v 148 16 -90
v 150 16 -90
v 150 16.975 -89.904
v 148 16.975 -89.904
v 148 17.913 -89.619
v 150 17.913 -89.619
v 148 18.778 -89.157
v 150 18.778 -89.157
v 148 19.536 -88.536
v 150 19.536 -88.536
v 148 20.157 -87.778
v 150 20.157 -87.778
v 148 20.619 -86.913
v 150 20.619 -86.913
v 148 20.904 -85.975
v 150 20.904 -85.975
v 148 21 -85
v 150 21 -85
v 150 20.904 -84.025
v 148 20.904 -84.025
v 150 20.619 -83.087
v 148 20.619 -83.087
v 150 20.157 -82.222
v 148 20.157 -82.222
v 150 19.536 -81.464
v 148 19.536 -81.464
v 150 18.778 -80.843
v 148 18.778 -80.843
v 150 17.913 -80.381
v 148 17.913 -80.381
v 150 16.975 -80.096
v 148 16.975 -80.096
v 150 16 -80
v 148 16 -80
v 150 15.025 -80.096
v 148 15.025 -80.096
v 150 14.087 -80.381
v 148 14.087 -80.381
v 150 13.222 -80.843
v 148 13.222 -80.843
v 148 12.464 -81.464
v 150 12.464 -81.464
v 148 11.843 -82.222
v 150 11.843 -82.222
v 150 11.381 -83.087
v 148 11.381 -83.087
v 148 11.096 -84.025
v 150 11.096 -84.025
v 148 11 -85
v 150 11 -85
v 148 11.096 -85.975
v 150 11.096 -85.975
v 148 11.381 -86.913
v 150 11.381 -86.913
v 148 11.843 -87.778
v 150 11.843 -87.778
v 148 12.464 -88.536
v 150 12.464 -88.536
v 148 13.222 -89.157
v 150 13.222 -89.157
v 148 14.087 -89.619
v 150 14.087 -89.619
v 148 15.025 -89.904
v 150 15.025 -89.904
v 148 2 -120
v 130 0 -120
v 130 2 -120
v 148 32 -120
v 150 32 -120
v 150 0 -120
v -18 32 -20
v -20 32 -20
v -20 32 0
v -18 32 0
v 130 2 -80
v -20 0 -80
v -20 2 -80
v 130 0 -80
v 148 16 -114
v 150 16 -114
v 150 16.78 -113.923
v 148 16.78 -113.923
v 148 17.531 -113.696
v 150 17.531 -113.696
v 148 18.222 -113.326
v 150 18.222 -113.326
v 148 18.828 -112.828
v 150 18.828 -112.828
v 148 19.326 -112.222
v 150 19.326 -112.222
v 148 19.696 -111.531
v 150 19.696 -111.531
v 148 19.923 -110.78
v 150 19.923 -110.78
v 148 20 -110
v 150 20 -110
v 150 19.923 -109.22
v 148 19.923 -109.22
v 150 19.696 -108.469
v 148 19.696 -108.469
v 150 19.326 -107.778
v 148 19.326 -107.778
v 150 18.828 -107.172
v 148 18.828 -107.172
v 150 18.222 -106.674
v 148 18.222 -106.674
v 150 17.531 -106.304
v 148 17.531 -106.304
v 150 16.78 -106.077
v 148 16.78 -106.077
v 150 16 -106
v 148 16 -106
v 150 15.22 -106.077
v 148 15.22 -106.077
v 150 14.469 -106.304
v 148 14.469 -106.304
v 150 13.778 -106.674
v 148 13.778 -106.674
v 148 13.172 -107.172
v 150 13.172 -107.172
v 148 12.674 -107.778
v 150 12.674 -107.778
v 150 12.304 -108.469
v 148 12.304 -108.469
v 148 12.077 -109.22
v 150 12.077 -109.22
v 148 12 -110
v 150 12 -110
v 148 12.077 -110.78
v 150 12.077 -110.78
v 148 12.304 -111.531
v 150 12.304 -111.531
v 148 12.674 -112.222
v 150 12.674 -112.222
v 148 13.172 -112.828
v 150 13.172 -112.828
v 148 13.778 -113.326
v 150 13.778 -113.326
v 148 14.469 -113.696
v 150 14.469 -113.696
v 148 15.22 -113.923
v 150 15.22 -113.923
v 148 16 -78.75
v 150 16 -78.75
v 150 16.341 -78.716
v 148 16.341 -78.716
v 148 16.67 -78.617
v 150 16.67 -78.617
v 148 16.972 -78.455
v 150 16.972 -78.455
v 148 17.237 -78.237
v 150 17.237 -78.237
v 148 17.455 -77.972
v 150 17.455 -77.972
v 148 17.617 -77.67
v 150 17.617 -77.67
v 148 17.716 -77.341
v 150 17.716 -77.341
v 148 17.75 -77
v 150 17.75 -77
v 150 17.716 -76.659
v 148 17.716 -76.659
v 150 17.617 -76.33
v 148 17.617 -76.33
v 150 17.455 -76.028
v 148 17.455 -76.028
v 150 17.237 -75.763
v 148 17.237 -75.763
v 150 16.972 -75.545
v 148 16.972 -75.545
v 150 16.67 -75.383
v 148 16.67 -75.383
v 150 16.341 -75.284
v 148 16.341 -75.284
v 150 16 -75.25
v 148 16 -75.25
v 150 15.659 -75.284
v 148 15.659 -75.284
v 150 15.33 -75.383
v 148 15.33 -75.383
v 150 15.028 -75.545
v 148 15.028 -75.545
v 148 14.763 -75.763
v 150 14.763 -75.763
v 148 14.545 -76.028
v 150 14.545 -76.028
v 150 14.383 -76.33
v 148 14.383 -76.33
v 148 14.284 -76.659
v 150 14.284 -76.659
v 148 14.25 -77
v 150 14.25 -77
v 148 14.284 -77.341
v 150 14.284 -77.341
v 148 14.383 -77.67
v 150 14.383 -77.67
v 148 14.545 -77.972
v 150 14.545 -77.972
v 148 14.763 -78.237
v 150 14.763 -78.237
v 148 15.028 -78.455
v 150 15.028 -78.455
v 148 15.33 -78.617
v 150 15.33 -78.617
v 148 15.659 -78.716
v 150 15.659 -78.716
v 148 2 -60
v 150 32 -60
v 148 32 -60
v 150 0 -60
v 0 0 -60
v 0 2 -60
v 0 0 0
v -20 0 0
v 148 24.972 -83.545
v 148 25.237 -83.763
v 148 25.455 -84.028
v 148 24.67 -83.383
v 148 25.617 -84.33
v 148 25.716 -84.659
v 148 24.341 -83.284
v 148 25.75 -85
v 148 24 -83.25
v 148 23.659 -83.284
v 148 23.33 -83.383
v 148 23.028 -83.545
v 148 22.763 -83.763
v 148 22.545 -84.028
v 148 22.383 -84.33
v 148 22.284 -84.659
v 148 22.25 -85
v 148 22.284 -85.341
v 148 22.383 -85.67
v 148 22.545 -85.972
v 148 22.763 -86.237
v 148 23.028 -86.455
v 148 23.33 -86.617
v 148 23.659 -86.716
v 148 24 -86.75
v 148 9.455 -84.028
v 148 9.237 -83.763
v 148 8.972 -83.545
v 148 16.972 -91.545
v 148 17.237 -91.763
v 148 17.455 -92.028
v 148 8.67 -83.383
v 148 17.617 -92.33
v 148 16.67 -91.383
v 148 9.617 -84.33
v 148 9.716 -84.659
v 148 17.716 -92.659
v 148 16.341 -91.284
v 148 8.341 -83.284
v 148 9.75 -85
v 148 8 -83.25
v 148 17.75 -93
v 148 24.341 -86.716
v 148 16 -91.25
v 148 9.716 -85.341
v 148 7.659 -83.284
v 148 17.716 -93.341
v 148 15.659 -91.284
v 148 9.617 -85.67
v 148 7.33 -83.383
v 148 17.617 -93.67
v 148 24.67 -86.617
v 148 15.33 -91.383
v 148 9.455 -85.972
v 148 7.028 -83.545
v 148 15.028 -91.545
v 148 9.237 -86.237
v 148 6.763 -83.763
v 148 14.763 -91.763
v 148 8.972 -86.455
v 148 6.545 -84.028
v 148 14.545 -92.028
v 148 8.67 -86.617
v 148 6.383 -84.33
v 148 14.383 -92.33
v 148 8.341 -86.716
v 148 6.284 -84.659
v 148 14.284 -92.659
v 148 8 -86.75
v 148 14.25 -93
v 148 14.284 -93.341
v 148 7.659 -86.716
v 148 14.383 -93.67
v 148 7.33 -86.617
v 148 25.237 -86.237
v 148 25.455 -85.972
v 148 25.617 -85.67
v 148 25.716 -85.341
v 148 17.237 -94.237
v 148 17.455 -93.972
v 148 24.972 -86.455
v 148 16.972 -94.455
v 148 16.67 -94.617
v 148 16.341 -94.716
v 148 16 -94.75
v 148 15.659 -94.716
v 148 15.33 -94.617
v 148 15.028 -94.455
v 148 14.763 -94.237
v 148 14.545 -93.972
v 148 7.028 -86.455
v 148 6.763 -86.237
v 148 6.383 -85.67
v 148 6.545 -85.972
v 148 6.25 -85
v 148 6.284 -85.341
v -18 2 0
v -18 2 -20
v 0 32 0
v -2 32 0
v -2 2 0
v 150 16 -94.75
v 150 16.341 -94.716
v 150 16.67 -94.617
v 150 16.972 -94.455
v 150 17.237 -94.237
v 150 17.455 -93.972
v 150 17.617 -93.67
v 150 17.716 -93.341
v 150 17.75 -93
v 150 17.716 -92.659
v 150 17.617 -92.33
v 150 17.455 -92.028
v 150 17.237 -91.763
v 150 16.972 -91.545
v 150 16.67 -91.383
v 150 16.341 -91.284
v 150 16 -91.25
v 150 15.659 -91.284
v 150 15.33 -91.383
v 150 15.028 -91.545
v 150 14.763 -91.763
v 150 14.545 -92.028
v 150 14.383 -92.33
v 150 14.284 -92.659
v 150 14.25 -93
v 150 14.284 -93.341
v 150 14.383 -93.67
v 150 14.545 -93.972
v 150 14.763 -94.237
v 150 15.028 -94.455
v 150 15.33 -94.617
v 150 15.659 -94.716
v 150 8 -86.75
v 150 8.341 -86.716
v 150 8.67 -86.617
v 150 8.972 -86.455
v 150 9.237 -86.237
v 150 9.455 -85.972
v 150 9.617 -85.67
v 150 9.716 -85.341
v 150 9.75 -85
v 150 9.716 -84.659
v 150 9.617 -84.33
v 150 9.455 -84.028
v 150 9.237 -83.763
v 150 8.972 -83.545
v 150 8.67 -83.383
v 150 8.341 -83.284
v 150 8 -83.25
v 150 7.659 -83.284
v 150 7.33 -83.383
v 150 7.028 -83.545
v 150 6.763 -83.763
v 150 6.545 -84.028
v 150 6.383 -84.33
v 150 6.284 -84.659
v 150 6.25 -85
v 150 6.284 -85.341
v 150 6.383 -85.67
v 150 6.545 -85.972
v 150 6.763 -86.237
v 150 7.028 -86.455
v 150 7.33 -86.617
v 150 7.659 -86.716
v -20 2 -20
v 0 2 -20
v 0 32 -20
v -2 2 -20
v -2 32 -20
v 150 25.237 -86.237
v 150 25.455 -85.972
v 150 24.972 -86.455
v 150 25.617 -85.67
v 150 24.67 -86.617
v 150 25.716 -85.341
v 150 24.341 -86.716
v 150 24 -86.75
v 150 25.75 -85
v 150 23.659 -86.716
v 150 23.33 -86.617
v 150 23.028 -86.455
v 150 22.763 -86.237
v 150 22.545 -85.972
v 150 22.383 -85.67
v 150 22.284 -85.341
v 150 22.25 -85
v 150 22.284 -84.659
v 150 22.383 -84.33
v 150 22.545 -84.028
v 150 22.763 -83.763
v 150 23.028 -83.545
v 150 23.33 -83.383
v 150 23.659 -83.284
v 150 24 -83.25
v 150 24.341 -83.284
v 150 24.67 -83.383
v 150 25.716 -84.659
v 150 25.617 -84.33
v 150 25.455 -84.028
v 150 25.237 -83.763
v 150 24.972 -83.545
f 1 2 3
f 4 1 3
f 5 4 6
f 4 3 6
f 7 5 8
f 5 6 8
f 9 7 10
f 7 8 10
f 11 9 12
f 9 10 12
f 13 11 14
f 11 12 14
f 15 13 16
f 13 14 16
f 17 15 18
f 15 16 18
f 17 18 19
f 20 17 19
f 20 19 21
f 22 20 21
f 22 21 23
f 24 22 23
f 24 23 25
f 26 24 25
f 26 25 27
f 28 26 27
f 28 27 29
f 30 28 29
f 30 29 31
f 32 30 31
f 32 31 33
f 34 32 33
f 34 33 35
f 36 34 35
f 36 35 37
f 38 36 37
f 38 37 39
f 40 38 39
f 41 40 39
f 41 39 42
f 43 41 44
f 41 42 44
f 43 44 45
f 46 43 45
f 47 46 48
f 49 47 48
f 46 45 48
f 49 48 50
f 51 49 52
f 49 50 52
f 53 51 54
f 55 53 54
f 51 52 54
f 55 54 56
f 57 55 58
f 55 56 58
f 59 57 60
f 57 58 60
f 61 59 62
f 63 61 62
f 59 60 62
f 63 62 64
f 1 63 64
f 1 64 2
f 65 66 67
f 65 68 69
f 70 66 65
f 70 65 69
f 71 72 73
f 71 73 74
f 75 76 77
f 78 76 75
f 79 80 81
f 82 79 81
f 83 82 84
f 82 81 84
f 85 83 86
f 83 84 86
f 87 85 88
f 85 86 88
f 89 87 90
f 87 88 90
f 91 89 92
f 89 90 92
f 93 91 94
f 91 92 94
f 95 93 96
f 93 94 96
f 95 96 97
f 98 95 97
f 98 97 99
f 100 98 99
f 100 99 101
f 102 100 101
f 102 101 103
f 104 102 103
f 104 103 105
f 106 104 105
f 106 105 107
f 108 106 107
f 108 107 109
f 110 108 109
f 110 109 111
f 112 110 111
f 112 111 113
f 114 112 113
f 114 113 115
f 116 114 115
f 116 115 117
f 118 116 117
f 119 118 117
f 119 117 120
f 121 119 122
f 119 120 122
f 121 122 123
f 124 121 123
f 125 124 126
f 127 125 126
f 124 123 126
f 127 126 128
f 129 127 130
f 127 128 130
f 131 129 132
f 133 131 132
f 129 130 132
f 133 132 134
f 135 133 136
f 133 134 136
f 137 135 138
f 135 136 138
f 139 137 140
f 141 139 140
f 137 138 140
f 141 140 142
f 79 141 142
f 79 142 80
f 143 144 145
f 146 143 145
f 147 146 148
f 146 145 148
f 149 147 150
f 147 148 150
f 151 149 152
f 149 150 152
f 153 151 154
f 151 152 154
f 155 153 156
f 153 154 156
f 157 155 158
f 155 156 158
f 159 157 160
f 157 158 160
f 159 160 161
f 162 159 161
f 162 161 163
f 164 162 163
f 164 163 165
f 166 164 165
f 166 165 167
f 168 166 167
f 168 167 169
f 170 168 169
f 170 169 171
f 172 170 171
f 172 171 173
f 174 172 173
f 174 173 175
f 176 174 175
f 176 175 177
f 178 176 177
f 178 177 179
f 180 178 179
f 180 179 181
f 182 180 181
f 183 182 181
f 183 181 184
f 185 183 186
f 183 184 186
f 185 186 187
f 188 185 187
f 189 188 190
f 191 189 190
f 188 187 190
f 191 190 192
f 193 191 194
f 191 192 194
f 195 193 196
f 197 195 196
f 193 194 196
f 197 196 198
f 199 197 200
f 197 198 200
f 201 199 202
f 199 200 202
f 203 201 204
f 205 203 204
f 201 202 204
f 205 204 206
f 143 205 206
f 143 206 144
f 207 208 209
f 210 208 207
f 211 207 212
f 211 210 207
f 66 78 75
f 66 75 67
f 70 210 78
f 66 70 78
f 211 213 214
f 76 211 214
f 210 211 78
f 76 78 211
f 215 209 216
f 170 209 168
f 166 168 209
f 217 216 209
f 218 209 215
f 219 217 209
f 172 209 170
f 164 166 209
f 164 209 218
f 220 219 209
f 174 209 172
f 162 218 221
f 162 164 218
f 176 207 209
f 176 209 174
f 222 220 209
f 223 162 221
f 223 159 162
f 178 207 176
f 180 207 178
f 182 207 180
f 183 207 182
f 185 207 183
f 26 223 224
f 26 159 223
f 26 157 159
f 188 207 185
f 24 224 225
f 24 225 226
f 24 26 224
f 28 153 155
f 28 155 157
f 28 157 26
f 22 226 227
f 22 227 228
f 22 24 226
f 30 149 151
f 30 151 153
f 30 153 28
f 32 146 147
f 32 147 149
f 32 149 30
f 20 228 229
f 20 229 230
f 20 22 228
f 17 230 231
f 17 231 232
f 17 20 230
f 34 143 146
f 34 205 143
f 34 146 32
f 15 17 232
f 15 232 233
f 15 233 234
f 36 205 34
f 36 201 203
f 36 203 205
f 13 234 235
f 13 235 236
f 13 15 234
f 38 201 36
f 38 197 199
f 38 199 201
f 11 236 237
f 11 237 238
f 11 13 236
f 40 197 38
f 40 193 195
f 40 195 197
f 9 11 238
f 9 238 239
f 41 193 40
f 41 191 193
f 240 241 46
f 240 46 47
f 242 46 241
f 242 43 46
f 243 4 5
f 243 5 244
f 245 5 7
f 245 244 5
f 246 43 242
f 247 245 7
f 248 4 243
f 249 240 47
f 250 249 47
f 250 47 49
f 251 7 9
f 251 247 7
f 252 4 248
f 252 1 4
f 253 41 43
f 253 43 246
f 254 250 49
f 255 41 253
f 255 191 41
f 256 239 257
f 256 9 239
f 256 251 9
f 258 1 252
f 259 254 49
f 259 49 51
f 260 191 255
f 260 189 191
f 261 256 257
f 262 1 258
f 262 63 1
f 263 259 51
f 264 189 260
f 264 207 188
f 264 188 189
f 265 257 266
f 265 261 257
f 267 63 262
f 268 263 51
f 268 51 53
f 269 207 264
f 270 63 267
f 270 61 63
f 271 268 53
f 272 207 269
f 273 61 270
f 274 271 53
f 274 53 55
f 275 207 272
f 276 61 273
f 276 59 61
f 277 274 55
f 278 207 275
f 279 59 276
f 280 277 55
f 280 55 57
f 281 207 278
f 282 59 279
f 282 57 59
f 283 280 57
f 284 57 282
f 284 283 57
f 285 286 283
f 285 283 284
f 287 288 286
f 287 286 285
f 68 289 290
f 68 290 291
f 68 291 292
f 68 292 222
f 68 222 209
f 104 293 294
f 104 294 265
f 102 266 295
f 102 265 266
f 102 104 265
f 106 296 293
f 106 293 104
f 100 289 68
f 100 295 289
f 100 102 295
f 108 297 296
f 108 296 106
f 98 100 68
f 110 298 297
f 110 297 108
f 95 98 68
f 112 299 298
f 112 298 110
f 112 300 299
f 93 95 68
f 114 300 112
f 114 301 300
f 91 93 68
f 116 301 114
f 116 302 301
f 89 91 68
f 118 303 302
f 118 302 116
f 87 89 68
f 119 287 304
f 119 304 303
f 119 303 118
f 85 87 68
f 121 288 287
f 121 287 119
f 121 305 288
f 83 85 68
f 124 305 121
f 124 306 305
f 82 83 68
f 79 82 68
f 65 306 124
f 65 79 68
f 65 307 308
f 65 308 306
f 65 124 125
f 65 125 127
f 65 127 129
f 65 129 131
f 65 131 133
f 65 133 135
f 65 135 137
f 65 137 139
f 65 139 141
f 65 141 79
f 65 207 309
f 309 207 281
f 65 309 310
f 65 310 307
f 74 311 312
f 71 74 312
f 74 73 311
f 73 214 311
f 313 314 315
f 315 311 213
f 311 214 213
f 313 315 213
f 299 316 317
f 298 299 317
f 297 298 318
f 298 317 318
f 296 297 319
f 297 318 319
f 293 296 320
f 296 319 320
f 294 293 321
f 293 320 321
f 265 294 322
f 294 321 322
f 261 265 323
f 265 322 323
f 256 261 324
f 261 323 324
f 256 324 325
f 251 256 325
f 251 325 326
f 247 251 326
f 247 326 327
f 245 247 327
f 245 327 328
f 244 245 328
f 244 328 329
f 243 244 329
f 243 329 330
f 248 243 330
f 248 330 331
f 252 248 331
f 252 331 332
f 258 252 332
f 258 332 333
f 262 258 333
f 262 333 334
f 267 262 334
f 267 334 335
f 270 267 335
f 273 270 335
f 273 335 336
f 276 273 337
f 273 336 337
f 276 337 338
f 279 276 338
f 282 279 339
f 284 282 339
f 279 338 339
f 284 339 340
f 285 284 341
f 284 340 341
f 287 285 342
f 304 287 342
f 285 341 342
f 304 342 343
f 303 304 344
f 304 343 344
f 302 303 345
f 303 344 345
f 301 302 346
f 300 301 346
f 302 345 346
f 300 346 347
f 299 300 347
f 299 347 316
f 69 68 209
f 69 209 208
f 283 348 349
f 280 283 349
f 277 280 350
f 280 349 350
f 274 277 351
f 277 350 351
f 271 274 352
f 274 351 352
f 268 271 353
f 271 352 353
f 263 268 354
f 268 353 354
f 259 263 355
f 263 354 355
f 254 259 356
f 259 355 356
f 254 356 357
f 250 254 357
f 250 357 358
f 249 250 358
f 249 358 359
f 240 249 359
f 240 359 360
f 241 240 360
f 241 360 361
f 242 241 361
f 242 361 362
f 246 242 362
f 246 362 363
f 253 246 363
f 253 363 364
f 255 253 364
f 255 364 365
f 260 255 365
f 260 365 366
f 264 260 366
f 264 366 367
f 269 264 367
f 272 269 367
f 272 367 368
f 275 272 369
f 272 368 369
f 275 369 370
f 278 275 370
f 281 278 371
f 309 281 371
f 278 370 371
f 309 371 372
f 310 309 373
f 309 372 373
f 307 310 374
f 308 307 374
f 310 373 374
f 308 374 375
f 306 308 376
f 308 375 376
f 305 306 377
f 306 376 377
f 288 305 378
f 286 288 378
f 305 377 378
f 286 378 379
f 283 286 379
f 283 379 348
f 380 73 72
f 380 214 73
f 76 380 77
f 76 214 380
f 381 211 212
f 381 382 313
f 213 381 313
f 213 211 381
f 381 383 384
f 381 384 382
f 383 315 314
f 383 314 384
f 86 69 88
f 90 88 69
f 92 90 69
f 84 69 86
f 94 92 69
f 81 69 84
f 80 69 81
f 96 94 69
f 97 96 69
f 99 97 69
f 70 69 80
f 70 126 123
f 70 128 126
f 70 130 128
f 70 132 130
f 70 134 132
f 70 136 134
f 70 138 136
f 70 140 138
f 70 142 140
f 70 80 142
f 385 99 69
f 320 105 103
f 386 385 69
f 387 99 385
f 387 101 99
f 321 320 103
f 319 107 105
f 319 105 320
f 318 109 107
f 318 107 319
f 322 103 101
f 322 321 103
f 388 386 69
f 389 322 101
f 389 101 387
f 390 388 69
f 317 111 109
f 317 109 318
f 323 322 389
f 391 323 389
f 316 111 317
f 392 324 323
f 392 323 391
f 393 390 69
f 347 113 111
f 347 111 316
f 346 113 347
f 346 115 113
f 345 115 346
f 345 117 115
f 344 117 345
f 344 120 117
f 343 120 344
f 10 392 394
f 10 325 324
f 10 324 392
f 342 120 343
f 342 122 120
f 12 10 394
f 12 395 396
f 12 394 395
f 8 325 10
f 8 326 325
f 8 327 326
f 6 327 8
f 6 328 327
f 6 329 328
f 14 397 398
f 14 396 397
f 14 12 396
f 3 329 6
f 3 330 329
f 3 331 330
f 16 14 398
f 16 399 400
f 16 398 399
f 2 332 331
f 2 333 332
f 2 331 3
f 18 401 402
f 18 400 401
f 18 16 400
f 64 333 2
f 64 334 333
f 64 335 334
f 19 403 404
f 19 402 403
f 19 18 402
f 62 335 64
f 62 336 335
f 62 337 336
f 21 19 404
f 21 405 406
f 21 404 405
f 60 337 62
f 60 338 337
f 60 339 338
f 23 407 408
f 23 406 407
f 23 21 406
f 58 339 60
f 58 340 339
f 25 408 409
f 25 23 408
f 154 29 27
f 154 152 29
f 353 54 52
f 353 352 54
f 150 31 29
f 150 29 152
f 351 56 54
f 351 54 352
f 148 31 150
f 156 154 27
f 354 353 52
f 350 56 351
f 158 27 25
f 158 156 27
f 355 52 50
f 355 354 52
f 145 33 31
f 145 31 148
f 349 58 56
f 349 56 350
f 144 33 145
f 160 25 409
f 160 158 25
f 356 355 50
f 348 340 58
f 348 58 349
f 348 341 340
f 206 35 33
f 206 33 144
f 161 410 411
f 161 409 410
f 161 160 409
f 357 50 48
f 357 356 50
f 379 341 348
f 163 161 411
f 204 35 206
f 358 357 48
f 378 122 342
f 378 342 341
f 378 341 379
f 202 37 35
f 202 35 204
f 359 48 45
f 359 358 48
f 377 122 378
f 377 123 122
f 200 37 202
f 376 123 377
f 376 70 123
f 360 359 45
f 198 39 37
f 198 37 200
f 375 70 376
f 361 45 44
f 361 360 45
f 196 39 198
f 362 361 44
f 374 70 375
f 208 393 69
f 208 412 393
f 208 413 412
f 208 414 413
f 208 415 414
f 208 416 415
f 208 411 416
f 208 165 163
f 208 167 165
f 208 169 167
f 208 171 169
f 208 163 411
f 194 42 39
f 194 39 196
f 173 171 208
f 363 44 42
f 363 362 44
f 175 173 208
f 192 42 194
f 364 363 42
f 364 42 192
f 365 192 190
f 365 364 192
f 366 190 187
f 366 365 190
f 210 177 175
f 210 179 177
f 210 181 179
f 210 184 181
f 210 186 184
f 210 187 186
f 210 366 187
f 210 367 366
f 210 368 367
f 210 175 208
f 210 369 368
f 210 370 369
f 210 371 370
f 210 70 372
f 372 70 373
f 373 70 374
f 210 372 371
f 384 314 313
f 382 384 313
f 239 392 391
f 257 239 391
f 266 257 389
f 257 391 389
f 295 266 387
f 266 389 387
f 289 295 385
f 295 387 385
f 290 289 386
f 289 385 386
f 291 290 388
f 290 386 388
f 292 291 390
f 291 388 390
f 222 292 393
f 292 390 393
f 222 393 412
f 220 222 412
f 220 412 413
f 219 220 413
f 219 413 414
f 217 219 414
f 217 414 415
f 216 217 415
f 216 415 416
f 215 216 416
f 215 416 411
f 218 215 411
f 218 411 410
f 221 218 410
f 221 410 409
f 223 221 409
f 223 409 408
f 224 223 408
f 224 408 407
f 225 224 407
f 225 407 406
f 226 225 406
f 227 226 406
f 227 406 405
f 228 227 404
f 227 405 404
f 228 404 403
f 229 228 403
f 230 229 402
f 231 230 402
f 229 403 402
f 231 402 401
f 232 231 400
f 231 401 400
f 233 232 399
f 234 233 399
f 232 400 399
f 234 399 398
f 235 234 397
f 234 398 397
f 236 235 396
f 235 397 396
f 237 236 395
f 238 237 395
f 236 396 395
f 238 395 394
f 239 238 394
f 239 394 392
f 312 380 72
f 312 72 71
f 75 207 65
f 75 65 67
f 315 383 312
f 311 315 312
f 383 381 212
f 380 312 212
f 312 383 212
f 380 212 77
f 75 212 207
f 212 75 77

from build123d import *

# Parameters (mm, degrees)
BOSS_EXTRUDE1_DEPTH = 2
SKETCH2_W           = 2
SKETCH2_H           = 20
SKETCH2_H_2         = 60
BOSS_EXTRUDE2_DEPTH = 30
CUT_EXTRUDE1_REACH  = 212.533
SKETCH3_R           = 5
SKETCH3_R_2         = 1.75
SKETCH3_R_3         = 4


with BuildPart() as part:
    # Sketch1 → Boss-Extrude1 (new body)
    with BuildSketch(Plane(origin=(0, 0, 0), x_dir=(1, 0, 0), z_dir=(0, 1, 0))):
        Polygon((150, 120), (150, 60), (0, 60), (0, 0), (-20, 0), (-20, 80), (130, 80), (130, 120), align=None)
    extrude(amount=BOSS_EXTRUDE1_DEPTH)

    # Sketch2 → Boss-Extrude2 (add)
    with BuildSketch(Plane(origin=(0, 2, 0), x_dir=(1, 0, 0), z_dir=(0, 1, 0))):
        with Locations((-19, 10)):
            Rectangle(SKETCH2_W, SKETCH2_H)
        with Locations((-1, 10)):
            Rectangle(SKETCH2_W, SKETCH2_H)
        with Locations((149, 90)):
            Rectangle(SKETCH2_W, SKETCH2_H_2)
    extrude(amount=BOSS_EXTRUDE2_DEPTH)

    # Sketch3 → Cut-Extrude1 (cut, up to next)
    with BuildSketch(Plane(origin=(150, 0, 0), x_dir=(0, 0, -1), z_dir=(1, 0, 0)), mode=Mode.PRIVATE) as cut_extrude1_sk1:
        with Locations((85, 16)):
            Circle(SKETCH3_R)
    cut_extrude1_tool1 = extrude(cut_extrude1_sk1.sketch, amount=-CUT_EXTRUDE1_REACH, mode=Mode.PRIVATE) & part.part
    # Sketch3 → Cut-Extrude1 (cut, up to next)
    with BuildSketch(Plane(origin=(150, 0, 0), x_dir=(0, 0, -1), z_dir=(1, 0, 0)), mode=Mode.PRIVATE) as cut_extrude1_sk2:
        with Locations((85, 24)):
            Circle(SKETCH3_R_2)
    cut_extrude1_tool2 = extrude(cut_extrude1_sk2.sketch, amount=-CUT_EXTRUDE1_REACH, mode=Mode.PRIVATE) & part.part
    # Sketch3 → Cut-Extrude1 (cut, up to next)
    with BuildSketch(Plane(origin=(150, 0, 0), x_dir=(0, 0, -1), z_dir=(1, 0, 0)), mode=Mode.PRIVATE) as cut_extrude1_sk3:
        with Locations((93, 16)):
            Circle(SKETCH3_R_2)
    cut_extrude1_tool3 = extrude(cut_extrude1_sk3.sketch, amount=-CUT_EXTRUDE1_REACH, mode=Mode.PRIVATE) & part.part
    # Sketch3 → Cut-Extrude1 (cut, up to next)
    with BuildSketch(Plane(origin=(150, 0, 0), x_dir=(0, 0, -1), z_dir=(1, 0, 0)), mode=Mode.PRIVATE) as cut_extrude1_sk4:
        with Locations((85, 8)):
            Circle(SKETCH3_R_2)
    cut_extrude1_tool4 = extrude(cut_extrude1_sk4.sketch, amount=-CUT_EXTRUDE1_REACH, mode=Mode.PRIVATE) & part.part
    # Sketch3 → Cut-Extrude1 (cut, up to next)
    with BuildSketch(Plane(origin=(150, 0, 0), x_dir=(0, 0, -1), z_dir=(1, 0, 0)), mode=Mode.PRIVATE) as cut_extrude1_sk5:
        with Locations((77, 16)):
            Circle(SKETCH3_R_2)
    cut_extrude1_tool5 = extrude(cut_extrude1_sk5.sketch, amount=-CUT_EXTRUDE1_REACH, mode=Mode.PRIVATE) & part.part
    # Sketch3 → Cut-Extrude1 (cut, up to next)
    with BuildSketch(Plane(origin=(150, 0, 0), x_dir=(0, 0, -1), z_dir=(1, 0, 0)), mode=Mode.PRIVATE) as cut_extrude1_sk6:
        with Locations((110, 16)):
            Circle(SKETCH3_R_3)
    cut_extrude1_tool6 = extrude(cut_extrude1_sk6.sketch, amount=-CUT_EXTRUDE1_REACH, mode=Mode.PRIVATE) & part.part
    add(cut_extrude1_tool1.solids().sort_by_distance((150, 16, -85))[0], mode=Mode.SUBTRACT)
    add(cut_extrude1_tool2.solids().sort_by_distance((150, 24, -85))[0], mode=Mode.SUBTRACT)
    add(cut_extrude1_tool3.solids().sort_by_distance((150, 16, -93))[0], mode=Mode.SUBTRACT)
    add(cut_extrude1_tool4.solids().sort_by_distance((150, 8, -85))[0], mode=Mode.SUBTRACT)
    add(cut_extrude1_tool5.solids().sort_by_distance((150, 16, -77))[0], mode=Mode.SUBTRACT)
    add(cut_extrude1_tool6.solids().sort_by_distance((150, 16, -110))[0], mode=Mode.SUBTRACT)


solid = part.part
